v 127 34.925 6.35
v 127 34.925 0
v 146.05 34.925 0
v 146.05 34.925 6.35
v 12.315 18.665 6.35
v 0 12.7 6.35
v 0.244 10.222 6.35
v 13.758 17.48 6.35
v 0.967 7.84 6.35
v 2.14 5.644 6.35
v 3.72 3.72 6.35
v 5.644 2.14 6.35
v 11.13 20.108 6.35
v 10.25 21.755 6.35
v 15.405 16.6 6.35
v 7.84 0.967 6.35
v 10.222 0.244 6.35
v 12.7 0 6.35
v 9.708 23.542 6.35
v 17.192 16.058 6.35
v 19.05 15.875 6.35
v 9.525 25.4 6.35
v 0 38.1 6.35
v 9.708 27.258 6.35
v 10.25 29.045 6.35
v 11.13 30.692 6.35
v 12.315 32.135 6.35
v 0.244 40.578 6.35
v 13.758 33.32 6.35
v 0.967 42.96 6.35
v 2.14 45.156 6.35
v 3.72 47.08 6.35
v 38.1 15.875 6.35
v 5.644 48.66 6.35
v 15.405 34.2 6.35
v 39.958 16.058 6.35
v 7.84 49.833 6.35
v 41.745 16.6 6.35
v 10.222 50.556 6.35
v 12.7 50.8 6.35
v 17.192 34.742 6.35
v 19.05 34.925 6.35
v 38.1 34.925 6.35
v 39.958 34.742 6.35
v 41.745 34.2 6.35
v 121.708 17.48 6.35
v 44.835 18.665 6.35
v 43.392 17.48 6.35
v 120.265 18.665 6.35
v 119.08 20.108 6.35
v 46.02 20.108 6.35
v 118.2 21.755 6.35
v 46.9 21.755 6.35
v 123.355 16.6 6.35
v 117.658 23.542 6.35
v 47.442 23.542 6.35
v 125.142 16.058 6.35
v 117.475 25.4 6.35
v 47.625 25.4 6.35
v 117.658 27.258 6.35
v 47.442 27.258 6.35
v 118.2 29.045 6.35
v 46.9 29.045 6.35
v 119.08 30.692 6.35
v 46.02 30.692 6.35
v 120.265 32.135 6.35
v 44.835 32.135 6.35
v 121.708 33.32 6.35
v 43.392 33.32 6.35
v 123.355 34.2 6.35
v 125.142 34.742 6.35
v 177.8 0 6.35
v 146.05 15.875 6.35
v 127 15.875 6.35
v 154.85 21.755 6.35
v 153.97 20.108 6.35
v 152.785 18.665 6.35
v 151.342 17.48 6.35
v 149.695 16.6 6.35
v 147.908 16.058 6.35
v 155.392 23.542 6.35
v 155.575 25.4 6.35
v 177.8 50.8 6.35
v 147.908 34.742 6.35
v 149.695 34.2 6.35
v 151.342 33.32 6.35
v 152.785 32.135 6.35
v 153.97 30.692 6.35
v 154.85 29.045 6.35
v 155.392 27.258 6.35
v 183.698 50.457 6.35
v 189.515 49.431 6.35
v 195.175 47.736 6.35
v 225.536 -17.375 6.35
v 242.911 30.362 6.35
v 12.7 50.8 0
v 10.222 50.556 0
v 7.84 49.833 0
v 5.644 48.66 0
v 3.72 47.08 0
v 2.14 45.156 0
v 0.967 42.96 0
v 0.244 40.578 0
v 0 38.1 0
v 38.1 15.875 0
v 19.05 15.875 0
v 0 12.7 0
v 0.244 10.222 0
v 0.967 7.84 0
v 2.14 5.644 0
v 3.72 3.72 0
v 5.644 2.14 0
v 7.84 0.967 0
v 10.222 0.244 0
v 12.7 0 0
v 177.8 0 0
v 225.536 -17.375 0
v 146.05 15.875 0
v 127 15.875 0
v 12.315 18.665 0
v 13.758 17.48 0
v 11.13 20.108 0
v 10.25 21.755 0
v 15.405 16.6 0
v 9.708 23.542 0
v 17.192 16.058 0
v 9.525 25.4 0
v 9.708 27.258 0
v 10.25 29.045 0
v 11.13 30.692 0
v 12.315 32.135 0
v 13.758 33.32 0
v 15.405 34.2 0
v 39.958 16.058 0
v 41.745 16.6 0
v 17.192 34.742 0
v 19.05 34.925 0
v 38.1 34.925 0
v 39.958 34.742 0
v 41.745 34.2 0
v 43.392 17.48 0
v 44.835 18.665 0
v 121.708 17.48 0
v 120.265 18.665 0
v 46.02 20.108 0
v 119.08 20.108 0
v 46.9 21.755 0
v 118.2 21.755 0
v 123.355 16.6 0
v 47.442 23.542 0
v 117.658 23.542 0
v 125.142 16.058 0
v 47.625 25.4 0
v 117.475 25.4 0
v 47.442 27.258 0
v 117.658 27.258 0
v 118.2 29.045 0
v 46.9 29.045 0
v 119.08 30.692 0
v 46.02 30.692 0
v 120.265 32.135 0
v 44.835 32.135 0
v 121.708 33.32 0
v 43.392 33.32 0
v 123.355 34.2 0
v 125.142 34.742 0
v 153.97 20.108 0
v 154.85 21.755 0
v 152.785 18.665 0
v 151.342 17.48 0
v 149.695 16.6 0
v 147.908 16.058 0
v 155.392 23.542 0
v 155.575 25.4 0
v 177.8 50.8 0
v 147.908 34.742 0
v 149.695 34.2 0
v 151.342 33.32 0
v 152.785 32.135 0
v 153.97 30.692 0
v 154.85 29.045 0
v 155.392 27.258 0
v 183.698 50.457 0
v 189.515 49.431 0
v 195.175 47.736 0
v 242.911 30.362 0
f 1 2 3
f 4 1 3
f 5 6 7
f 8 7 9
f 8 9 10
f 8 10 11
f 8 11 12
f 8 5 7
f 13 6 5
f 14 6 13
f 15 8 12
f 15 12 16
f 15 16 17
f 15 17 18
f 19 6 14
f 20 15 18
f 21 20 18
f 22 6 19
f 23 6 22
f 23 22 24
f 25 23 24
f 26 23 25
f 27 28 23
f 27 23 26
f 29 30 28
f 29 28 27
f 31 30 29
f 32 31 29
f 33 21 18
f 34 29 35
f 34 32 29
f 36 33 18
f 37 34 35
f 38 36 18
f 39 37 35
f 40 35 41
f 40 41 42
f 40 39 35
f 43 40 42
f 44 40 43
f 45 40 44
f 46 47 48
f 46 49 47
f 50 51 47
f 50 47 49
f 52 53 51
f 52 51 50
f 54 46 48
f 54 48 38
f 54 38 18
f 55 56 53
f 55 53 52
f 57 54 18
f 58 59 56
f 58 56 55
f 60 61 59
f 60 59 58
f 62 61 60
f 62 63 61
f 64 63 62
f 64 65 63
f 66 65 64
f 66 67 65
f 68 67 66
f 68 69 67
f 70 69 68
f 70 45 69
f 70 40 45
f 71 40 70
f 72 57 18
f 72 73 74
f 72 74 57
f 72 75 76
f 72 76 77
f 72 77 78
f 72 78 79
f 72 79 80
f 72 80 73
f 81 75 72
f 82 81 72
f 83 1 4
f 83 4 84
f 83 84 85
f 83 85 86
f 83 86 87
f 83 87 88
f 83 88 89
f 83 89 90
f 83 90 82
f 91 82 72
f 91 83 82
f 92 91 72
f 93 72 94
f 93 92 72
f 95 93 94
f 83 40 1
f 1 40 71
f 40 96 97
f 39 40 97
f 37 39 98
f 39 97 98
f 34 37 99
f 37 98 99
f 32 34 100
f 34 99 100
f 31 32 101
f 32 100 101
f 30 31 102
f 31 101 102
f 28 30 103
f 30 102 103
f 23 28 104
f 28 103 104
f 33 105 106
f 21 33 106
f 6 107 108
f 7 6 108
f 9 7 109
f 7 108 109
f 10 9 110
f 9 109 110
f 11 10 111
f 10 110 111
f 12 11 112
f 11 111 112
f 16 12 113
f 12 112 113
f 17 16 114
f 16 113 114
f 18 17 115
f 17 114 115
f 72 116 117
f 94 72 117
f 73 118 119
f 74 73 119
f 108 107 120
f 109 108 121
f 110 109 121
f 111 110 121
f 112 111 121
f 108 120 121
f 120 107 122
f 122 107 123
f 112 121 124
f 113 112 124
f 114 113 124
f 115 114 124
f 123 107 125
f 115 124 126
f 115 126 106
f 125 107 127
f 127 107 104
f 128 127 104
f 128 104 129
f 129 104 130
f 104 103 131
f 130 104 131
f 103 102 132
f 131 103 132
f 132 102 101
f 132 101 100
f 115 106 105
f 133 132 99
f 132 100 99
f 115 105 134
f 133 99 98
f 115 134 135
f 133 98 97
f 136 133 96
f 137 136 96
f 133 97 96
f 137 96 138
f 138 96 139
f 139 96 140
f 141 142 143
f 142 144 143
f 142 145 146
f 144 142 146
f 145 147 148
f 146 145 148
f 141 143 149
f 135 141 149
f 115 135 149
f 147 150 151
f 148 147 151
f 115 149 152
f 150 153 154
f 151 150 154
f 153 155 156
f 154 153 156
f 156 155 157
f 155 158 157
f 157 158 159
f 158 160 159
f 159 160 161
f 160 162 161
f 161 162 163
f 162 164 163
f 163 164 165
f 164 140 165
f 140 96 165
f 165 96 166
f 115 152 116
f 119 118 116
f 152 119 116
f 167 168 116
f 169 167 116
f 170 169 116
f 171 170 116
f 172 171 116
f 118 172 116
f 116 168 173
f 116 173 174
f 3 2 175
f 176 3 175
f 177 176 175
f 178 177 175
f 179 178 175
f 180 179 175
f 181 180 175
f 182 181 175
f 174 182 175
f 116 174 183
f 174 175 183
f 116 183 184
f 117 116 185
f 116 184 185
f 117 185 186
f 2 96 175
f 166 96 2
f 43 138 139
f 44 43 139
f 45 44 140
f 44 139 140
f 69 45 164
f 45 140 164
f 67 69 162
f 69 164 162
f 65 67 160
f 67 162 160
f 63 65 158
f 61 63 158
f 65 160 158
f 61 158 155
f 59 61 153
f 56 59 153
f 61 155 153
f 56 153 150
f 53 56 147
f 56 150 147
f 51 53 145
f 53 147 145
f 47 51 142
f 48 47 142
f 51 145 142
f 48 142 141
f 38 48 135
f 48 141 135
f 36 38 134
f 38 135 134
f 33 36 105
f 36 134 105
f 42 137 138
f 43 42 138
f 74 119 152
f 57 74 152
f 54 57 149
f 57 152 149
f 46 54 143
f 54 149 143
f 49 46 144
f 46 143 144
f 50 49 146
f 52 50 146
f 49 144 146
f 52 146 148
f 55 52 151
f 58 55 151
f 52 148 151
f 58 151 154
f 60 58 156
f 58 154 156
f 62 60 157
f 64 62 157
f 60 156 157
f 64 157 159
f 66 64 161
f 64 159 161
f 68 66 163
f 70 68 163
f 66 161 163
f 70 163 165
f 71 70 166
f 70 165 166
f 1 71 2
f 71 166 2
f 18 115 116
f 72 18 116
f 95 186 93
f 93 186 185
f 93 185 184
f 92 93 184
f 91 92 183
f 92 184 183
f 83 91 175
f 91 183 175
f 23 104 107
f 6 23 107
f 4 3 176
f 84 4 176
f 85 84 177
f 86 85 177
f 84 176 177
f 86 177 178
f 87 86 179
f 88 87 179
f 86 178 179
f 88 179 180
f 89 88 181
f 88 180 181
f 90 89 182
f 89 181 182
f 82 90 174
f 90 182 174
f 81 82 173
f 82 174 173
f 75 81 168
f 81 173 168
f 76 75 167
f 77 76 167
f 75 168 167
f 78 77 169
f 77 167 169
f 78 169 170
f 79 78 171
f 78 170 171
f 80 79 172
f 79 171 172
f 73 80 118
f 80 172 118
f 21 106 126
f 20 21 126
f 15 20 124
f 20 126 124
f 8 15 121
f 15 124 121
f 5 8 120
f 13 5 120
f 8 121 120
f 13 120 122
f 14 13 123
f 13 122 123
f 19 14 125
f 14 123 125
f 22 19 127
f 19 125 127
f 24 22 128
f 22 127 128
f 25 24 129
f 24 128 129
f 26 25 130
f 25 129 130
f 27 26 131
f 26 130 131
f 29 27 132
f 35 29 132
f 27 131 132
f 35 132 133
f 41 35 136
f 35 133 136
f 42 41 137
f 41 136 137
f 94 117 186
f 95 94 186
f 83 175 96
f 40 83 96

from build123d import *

# Parameters (mm, degrees)
F1_DEPTH = 6.35


with BuildPart() as f1:
    # F0 (on Top) → F1 (new body)
    with BuildSketch(Plane.XY):
        with BuildLine():
            ThreePointArc((0, 12.7), (3.719744, 3.719744), (12.7, 0))
            Line((12.7, 0), (177.8, 0))
            Line((177.8, 0), (225.536385, -17.374623))
            Line((225.536385, -17.374623), (242.911008, 30.361762))
            Line((242.911008, 30.361762), (195.174623, 47.736385))
            ThreePointArc((195.174623, 47.736385), (186.621327, 50.028234), (177.8, 50.8))
            Line((177.8, 50.8), (12.7, 50.8))
            ThreePointArc((12.7, 50.8), (3.719744, 47.080256), (0, 38.1))
            Line((0, 38.1), (0, 12.7))
        make_face()
        with BuildLine():
            ThreePointArc((19.05, 15.875), (9.525, 25.4), (19.05, 34.925))
            Line((19.05, 34.925), (38.1, 34.925))
            ThreePointArc((38.1, 34.925), (47.625, 25.4), (38.1, 15.875))
            Line((38.1, 15.875), (19.05, 15.875))
        make_face(mode=Mode.SUBTRACT)
        with BuildLine():
            ThreePointArc((127, 15.875), (117.475, 25.4), (127, 34.925))
            Line((127, 34.925), (146.05, 34.925))
            ThreePointArc((146.05, 34.925), (155.575, 25.4), (146.05, 15.875))
            Line((146.05, 15.875), (127, 15.875))
        make_face(mode=Mode.SUBTRACT)
    extrude(amount=F1_DEPTH)


solid = f1.part
